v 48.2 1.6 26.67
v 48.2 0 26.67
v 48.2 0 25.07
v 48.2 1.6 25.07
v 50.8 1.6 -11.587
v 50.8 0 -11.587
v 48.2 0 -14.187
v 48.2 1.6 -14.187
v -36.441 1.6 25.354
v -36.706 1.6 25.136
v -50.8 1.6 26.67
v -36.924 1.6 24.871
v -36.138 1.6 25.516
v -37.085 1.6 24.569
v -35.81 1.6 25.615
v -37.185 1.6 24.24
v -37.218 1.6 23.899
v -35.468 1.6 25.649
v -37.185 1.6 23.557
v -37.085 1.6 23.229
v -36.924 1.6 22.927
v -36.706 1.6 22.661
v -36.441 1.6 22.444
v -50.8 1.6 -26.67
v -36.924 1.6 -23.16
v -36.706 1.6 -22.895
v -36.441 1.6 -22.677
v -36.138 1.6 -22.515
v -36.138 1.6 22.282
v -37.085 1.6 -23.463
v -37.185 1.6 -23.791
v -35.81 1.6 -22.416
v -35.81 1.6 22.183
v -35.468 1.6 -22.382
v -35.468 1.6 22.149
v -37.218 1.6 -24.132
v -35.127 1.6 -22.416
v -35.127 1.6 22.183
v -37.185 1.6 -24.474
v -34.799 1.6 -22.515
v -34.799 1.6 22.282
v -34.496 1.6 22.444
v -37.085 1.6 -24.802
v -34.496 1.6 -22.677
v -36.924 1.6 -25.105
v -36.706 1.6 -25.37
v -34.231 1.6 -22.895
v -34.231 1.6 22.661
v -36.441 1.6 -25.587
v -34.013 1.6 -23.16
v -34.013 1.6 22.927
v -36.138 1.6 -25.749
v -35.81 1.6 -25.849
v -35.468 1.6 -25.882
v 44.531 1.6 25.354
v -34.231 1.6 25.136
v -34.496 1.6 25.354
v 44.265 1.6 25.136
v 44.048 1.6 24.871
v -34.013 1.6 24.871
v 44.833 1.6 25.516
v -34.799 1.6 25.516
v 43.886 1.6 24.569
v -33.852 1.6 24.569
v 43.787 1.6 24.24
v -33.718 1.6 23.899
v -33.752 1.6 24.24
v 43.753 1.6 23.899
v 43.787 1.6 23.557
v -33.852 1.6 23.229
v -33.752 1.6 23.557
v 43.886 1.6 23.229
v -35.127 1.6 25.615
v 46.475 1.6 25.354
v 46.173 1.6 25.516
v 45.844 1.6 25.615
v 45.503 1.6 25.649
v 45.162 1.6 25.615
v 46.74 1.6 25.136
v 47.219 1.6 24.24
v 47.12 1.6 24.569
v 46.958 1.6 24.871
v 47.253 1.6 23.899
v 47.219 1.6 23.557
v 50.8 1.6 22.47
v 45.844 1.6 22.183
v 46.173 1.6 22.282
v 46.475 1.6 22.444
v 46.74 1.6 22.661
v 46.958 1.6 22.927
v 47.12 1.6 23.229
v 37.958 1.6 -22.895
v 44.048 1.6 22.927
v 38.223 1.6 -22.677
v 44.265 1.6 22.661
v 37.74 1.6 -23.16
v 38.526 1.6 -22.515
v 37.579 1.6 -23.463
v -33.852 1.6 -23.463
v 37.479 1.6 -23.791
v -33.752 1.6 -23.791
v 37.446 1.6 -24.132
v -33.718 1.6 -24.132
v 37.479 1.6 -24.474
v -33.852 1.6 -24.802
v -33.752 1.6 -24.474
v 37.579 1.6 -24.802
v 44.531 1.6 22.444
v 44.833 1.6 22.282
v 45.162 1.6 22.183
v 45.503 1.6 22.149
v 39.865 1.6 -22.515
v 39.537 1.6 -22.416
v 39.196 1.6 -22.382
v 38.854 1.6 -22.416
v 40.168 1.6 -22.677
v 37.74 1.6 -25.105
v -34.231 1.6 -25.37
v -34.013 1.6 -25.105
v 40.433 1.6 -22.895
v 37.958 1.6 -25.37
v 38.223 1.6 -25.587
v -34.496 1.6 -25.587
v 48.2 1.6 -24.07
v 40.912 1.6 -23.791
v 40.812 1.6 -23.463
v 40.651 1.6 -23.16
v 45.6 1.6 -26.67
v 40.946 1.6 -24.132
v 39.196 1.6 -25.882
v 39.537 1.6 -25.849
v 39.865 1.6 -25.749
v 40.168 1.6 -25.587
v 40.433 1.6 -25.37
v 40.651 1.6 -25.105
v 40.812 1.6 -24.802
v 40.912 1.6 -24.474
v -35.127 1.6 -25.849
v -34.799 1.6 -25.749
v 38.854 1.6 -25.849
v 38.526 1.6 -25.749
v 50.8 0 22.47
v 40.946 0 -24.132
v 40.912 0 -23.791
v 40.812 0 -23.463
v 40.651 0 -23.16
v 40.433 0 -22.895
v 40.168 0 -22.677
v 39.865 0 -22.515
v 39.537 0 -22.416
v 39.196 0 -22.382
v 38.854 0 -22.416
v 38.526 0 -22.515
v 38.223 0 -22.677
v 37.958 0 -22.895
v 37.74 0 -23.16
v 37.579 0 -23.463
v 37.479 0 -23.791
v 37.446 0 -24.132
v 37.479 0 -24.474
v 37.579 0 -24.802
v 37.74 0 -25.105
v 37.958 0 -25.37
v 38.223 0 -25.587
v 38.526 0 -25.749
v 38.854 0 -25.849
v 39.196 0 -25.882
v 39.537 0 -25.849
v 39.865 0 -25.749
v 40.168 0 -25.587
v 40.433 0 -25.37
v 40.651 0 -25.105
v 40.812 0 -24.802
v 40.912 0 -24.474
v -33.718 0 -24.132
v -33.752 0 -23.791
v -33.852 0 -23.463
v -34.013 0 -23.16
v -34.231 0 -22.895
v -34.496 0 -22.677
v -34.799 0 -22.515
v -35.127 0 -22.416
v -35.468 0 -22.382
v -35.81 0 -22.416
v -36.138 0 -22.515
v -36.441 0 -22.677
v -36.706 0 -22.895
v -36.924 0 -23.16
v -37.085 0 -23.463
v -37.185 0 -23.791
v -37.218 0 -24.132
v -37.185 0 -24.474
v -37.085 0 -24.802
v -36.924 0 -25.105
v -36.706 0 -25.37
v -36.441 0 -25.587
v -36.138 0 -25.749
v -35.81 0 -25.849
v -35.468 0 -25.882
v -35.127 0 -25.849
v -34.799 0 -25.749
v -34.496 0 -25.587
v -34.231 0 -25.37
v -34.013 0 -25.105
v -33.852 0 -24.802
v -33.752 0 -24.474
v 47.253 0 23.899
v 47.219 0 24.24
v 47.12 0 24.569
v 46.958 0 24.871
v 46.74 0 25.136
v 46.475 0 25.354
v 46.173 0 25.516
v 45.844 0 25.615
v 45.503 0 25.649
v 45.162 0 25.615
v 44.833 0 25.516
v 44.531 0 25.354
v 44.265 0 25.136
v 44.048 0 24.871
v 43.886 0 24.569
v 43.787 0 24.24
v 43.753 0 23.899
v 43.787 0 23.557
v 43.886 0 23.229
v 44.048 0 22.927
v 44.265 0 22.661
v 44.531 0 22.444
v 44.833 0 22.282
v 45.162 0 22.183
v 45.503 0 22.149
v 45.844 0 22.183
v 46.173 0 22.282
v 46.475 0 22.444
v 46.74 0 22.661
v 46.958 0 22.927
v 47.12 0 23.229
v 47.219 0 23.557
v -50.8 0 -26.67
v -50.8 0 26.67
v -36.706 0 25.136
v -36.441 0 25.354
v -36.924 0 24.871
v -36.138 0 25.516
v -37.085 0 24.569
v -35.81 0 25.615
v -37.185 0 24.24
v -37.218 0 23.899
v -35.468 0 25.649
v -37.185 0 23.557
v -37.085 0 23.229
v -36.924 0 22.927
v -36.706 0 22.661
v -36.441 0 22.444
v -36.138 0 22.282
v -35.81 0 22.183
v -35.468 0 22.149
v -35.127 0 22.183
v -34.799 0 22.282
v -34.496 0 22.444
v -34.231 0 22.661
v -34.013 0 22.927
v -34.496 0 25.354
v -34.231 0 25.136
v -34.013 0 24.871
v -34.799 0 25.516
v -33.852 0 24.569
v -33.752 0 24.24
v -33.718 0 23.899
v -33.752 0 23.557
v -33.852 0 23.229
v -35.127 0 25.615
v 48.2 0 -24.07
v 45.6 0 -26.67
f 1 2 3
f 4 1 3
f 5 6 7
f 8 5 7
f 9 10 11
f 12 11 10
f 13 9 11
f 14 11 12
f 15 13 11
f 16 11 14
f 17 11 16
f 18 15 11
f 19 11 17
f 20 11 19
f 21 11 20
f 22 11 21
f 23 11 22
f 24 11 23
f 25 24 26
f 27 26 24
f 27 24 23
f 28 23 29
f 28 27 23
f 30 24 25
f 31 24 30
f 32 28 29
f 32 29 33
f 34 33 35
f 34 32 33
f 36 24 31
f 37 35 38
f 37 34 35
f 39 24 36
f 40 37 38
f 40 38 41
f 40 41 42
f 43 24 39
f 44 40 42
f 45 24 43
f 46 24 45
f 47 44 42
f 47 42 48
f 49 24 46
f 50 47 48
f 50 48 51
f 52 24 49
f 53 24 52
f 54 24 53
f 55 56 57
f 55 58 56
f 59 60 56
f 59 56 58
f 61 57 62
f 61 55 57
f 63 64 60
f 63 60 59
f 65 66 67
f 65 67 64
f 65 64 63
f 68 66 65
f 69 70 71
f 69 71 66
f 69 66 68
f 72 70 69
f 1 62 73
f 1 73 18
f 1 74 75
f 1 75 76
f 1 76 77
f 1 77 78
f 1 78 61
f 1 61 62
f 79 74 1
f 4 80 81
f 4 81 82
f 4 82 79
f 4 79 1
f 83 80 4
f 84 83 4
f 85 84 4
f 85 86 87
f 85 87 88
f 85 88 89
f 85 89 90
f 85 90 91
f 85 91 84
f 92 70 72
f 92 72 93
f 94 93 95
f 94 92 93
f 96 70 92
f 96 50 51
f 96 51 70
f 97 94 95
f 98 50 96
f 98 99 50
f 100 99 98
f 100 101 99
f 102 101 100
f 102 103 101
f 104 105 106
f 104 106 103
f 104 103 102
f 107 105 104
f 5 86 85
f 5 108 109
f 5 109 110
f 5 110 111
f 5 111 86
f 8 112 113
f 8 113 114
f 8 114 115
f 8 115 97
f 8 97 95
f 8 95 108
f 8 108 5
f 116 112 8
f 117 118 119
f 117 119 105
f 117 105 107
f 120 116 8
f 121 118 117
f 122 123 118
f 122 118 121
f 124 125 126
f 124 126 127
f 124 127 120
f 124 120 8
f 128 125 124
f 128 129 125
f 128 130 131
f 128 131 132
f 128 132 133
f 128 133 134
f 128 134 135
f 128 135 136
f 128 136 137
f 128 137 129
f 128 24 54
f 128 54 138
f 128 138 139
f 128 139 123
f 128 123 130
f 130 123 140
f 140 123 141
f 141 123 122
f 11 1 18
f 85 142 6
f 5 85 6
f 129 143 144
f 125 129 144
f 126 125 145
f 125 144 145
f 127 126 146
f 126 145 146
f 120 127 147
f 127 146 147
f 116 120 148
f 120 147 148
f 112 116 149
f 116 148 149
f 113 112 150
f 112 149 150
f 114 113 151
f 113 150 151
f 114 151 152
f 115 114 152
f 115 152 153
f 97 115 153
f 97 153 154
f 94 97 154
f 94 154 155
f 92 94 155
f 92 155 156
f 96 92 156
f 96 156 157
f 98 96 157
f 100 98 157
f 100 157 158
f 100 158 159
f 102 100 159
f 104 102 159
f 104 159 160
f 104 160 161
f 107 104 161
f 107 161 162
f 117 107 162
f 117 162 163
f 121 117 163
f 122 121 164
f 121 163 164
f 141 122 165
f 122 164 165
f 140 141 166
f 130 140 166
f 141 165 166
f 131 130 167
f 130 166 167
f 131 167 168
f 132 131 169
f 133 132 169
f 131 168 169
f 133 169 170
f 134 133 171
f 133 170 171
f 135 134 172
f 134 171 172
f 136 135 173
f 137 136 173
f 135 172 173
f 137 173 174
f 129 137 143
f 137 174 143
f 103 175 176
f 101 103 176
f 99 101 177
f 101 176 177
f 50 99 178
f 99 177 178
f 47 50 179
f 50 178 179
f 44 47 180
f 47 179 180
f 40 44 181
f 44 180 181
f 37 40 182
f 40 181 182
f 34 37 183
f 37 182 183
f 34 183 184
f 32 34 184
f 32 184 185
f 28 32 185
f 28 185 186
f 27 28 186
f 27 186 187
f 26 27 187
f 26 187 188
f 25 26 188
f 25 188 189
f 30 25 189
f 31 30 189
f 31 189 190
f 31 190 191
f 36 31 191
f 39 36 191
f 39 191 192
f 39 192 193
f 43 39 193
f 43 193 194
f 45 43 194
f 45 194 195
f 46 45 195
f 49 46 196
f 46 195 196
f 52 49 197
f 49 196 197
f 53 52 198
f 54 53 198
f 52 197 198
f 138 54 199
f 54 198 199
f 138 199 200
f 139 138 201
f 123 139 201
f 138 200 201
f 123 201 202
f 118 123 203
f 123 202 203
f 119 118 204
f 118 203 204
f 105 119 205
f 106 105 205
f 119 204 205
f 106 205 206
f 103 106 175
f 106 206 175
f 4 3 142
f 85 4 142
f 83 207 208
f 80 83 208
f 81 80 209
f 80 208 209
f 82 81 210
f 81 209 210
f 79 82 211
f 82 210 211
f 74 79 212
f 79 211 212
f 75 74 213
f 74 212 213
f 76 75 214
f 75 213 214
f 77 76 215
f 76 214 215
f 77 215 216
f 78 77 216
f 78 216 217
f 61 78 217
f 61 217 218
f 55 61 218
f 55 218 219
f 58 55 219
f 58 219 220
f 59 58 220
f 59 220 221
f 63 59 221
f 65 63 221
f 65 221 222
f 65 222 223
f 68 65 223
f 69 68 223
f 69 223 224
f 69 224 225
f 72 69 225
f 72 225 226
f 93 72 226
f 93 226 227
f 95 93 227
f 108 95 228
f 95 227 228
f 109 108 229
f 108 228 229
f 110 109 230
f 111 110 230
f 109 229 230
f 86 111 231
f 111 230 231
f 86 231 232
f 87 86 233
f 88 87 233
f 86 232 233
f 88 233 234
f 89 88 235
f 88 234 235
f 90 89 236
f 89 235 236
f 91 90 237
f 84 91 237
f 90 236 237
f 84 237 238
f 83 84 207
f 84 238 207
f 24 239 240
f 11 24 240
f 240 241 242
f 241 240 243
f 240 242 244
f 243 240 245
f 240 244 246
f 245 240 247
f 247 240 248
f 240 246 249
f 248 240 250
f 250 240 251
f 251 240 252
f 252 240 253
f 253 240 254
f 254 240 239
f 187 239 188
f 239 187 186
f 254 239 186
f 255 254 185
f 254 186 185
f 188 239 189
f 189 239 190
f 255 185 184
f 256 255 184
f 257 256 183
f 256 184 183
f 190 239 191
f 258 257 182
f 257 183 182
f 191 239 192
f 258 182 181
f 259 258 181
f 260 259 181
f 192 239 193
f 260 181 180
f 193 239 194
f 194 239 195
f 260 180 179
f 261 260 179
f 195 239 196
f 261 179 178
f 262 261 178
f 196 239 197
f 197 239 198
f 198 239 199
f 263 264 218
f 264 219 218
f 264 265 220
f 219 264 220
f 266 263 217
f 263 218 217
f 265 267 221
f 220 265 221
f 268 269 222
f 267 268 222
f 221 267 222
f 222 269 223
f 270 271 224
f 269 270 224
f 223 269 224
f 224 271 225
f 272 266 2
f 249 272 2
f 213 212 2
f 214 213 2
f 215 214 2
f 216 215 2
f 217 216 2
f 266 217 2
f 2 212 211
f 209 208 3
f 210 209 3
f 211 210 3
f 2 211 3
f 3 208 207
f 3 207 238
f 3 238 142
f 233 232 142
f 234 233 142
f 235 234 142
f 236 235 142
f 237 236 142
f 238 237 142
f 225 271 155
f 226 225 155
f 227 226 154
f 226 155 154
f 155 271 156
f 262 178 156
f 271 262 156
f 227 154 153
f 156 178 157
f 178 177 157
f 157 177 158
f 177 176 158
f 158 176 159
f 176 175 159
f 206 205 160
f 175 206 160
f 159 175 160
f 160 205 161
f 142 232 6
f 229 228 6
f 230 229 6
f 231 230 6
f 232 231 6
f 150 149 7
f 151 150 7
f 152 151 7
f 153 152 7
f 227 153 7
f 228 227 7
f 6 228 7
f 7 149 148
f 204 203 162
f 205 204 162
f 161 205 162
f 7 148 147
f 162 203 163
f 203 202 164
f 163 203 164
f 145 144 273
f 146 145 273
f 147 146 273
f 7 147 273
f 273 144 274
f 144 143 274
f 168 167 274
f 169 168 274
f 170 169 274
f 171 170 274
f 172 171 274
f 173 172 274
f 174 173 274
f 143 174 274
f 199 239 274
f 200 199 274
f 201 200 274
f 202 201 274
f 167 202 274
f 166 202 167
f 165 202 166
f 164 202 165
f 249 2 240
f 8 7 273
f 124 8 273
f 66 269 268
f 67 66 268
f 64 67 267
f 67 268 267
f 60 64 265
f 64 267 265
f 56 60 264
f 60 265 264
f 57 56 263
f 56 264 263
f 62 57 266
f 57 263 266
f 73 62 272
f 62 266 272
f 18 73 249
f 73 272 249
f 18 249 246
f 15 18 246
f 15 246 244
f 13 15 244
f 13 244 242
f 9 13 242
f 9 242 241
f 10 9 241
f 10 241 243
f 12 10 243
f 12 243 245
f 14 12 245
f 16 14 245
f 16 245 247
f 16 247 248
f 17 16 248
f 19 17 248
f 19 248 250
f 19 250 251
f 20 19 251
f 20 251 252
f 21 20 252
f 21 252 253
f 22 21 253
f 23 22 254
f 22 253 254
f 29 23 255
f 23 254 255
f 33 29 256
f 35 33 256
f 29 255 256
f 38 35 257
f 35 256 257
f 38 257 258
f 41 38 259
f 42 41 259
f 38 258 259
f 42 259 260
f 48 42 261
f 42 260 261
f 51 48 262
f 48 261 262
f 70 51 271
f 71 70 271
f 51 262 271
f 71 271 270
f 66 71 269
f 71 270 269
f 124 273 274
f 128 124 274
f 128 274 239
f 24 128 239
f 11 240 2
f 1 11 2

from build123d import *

# Parameters (mm, degrees)
BOSS_EXTRUDE1_DEPTH            = 1.6
F_3_5_3_5_DIAMETER_HOLE1_D     = 3.5
F_3_5_3_5_DIAMETER_HOLE1_DEPTH = 3
F_3_5_3_5_DIAMETER_HOLE1_TIP   = 1.051506083


with BuildPart() as part:
    # Sketch2 → Boss-Extrude1 (new body)
    with BuildSketch(Plane(origin=(0, 0, 0), x_dir=(1, 0, 0), z_dir=(0, 1, 0))):
        Polygon((50.8, -22.47), (50.8, 11.586871141), (48.2, 14.186871141), (48.2, 24.07), (45.6, 26.67), (-50.8, 26.67), (-50.8, -26.67), (48.2, -26.67), (48.2, -25.07), align=None)
    extrude(amount=BOSS_EXTRUDE1_DEPTH)

    # Ø3.5 (3.5) Diameter Hole1
    with Locations(Plane(origin=(0, 1.6, 0), x_dir=(-1, 0, 0), z_dir=(0, 1, 0))):
        with Locations((35.468438844, -24.132254762), (35.468438844, 23.898881858), (-45.502928223, 23.898881858), (-39.195511542, -24.132254762)):
            Hole(F_3_5_3_5_DIAMETER_HOLE1_D / 2, depth=F_3_5_3_5_DIAMETER_HOLE1_DEPTH)
            with Locations((0, 0, -(F_3_5_3_5_DIAMETER_HOLE1_DEPTH + F_3_5_3_5_DIAMETER_HOLE1_TIP / 2))):  # 118° drill point
                Cone(0, F_3_5_3_5_DIAMETER_HOLE1_D / 2, F_3_5_3_5_DIAMETER_HOLE1_TIP, mode=Mode.SUBTRACT)


solid = part.part
